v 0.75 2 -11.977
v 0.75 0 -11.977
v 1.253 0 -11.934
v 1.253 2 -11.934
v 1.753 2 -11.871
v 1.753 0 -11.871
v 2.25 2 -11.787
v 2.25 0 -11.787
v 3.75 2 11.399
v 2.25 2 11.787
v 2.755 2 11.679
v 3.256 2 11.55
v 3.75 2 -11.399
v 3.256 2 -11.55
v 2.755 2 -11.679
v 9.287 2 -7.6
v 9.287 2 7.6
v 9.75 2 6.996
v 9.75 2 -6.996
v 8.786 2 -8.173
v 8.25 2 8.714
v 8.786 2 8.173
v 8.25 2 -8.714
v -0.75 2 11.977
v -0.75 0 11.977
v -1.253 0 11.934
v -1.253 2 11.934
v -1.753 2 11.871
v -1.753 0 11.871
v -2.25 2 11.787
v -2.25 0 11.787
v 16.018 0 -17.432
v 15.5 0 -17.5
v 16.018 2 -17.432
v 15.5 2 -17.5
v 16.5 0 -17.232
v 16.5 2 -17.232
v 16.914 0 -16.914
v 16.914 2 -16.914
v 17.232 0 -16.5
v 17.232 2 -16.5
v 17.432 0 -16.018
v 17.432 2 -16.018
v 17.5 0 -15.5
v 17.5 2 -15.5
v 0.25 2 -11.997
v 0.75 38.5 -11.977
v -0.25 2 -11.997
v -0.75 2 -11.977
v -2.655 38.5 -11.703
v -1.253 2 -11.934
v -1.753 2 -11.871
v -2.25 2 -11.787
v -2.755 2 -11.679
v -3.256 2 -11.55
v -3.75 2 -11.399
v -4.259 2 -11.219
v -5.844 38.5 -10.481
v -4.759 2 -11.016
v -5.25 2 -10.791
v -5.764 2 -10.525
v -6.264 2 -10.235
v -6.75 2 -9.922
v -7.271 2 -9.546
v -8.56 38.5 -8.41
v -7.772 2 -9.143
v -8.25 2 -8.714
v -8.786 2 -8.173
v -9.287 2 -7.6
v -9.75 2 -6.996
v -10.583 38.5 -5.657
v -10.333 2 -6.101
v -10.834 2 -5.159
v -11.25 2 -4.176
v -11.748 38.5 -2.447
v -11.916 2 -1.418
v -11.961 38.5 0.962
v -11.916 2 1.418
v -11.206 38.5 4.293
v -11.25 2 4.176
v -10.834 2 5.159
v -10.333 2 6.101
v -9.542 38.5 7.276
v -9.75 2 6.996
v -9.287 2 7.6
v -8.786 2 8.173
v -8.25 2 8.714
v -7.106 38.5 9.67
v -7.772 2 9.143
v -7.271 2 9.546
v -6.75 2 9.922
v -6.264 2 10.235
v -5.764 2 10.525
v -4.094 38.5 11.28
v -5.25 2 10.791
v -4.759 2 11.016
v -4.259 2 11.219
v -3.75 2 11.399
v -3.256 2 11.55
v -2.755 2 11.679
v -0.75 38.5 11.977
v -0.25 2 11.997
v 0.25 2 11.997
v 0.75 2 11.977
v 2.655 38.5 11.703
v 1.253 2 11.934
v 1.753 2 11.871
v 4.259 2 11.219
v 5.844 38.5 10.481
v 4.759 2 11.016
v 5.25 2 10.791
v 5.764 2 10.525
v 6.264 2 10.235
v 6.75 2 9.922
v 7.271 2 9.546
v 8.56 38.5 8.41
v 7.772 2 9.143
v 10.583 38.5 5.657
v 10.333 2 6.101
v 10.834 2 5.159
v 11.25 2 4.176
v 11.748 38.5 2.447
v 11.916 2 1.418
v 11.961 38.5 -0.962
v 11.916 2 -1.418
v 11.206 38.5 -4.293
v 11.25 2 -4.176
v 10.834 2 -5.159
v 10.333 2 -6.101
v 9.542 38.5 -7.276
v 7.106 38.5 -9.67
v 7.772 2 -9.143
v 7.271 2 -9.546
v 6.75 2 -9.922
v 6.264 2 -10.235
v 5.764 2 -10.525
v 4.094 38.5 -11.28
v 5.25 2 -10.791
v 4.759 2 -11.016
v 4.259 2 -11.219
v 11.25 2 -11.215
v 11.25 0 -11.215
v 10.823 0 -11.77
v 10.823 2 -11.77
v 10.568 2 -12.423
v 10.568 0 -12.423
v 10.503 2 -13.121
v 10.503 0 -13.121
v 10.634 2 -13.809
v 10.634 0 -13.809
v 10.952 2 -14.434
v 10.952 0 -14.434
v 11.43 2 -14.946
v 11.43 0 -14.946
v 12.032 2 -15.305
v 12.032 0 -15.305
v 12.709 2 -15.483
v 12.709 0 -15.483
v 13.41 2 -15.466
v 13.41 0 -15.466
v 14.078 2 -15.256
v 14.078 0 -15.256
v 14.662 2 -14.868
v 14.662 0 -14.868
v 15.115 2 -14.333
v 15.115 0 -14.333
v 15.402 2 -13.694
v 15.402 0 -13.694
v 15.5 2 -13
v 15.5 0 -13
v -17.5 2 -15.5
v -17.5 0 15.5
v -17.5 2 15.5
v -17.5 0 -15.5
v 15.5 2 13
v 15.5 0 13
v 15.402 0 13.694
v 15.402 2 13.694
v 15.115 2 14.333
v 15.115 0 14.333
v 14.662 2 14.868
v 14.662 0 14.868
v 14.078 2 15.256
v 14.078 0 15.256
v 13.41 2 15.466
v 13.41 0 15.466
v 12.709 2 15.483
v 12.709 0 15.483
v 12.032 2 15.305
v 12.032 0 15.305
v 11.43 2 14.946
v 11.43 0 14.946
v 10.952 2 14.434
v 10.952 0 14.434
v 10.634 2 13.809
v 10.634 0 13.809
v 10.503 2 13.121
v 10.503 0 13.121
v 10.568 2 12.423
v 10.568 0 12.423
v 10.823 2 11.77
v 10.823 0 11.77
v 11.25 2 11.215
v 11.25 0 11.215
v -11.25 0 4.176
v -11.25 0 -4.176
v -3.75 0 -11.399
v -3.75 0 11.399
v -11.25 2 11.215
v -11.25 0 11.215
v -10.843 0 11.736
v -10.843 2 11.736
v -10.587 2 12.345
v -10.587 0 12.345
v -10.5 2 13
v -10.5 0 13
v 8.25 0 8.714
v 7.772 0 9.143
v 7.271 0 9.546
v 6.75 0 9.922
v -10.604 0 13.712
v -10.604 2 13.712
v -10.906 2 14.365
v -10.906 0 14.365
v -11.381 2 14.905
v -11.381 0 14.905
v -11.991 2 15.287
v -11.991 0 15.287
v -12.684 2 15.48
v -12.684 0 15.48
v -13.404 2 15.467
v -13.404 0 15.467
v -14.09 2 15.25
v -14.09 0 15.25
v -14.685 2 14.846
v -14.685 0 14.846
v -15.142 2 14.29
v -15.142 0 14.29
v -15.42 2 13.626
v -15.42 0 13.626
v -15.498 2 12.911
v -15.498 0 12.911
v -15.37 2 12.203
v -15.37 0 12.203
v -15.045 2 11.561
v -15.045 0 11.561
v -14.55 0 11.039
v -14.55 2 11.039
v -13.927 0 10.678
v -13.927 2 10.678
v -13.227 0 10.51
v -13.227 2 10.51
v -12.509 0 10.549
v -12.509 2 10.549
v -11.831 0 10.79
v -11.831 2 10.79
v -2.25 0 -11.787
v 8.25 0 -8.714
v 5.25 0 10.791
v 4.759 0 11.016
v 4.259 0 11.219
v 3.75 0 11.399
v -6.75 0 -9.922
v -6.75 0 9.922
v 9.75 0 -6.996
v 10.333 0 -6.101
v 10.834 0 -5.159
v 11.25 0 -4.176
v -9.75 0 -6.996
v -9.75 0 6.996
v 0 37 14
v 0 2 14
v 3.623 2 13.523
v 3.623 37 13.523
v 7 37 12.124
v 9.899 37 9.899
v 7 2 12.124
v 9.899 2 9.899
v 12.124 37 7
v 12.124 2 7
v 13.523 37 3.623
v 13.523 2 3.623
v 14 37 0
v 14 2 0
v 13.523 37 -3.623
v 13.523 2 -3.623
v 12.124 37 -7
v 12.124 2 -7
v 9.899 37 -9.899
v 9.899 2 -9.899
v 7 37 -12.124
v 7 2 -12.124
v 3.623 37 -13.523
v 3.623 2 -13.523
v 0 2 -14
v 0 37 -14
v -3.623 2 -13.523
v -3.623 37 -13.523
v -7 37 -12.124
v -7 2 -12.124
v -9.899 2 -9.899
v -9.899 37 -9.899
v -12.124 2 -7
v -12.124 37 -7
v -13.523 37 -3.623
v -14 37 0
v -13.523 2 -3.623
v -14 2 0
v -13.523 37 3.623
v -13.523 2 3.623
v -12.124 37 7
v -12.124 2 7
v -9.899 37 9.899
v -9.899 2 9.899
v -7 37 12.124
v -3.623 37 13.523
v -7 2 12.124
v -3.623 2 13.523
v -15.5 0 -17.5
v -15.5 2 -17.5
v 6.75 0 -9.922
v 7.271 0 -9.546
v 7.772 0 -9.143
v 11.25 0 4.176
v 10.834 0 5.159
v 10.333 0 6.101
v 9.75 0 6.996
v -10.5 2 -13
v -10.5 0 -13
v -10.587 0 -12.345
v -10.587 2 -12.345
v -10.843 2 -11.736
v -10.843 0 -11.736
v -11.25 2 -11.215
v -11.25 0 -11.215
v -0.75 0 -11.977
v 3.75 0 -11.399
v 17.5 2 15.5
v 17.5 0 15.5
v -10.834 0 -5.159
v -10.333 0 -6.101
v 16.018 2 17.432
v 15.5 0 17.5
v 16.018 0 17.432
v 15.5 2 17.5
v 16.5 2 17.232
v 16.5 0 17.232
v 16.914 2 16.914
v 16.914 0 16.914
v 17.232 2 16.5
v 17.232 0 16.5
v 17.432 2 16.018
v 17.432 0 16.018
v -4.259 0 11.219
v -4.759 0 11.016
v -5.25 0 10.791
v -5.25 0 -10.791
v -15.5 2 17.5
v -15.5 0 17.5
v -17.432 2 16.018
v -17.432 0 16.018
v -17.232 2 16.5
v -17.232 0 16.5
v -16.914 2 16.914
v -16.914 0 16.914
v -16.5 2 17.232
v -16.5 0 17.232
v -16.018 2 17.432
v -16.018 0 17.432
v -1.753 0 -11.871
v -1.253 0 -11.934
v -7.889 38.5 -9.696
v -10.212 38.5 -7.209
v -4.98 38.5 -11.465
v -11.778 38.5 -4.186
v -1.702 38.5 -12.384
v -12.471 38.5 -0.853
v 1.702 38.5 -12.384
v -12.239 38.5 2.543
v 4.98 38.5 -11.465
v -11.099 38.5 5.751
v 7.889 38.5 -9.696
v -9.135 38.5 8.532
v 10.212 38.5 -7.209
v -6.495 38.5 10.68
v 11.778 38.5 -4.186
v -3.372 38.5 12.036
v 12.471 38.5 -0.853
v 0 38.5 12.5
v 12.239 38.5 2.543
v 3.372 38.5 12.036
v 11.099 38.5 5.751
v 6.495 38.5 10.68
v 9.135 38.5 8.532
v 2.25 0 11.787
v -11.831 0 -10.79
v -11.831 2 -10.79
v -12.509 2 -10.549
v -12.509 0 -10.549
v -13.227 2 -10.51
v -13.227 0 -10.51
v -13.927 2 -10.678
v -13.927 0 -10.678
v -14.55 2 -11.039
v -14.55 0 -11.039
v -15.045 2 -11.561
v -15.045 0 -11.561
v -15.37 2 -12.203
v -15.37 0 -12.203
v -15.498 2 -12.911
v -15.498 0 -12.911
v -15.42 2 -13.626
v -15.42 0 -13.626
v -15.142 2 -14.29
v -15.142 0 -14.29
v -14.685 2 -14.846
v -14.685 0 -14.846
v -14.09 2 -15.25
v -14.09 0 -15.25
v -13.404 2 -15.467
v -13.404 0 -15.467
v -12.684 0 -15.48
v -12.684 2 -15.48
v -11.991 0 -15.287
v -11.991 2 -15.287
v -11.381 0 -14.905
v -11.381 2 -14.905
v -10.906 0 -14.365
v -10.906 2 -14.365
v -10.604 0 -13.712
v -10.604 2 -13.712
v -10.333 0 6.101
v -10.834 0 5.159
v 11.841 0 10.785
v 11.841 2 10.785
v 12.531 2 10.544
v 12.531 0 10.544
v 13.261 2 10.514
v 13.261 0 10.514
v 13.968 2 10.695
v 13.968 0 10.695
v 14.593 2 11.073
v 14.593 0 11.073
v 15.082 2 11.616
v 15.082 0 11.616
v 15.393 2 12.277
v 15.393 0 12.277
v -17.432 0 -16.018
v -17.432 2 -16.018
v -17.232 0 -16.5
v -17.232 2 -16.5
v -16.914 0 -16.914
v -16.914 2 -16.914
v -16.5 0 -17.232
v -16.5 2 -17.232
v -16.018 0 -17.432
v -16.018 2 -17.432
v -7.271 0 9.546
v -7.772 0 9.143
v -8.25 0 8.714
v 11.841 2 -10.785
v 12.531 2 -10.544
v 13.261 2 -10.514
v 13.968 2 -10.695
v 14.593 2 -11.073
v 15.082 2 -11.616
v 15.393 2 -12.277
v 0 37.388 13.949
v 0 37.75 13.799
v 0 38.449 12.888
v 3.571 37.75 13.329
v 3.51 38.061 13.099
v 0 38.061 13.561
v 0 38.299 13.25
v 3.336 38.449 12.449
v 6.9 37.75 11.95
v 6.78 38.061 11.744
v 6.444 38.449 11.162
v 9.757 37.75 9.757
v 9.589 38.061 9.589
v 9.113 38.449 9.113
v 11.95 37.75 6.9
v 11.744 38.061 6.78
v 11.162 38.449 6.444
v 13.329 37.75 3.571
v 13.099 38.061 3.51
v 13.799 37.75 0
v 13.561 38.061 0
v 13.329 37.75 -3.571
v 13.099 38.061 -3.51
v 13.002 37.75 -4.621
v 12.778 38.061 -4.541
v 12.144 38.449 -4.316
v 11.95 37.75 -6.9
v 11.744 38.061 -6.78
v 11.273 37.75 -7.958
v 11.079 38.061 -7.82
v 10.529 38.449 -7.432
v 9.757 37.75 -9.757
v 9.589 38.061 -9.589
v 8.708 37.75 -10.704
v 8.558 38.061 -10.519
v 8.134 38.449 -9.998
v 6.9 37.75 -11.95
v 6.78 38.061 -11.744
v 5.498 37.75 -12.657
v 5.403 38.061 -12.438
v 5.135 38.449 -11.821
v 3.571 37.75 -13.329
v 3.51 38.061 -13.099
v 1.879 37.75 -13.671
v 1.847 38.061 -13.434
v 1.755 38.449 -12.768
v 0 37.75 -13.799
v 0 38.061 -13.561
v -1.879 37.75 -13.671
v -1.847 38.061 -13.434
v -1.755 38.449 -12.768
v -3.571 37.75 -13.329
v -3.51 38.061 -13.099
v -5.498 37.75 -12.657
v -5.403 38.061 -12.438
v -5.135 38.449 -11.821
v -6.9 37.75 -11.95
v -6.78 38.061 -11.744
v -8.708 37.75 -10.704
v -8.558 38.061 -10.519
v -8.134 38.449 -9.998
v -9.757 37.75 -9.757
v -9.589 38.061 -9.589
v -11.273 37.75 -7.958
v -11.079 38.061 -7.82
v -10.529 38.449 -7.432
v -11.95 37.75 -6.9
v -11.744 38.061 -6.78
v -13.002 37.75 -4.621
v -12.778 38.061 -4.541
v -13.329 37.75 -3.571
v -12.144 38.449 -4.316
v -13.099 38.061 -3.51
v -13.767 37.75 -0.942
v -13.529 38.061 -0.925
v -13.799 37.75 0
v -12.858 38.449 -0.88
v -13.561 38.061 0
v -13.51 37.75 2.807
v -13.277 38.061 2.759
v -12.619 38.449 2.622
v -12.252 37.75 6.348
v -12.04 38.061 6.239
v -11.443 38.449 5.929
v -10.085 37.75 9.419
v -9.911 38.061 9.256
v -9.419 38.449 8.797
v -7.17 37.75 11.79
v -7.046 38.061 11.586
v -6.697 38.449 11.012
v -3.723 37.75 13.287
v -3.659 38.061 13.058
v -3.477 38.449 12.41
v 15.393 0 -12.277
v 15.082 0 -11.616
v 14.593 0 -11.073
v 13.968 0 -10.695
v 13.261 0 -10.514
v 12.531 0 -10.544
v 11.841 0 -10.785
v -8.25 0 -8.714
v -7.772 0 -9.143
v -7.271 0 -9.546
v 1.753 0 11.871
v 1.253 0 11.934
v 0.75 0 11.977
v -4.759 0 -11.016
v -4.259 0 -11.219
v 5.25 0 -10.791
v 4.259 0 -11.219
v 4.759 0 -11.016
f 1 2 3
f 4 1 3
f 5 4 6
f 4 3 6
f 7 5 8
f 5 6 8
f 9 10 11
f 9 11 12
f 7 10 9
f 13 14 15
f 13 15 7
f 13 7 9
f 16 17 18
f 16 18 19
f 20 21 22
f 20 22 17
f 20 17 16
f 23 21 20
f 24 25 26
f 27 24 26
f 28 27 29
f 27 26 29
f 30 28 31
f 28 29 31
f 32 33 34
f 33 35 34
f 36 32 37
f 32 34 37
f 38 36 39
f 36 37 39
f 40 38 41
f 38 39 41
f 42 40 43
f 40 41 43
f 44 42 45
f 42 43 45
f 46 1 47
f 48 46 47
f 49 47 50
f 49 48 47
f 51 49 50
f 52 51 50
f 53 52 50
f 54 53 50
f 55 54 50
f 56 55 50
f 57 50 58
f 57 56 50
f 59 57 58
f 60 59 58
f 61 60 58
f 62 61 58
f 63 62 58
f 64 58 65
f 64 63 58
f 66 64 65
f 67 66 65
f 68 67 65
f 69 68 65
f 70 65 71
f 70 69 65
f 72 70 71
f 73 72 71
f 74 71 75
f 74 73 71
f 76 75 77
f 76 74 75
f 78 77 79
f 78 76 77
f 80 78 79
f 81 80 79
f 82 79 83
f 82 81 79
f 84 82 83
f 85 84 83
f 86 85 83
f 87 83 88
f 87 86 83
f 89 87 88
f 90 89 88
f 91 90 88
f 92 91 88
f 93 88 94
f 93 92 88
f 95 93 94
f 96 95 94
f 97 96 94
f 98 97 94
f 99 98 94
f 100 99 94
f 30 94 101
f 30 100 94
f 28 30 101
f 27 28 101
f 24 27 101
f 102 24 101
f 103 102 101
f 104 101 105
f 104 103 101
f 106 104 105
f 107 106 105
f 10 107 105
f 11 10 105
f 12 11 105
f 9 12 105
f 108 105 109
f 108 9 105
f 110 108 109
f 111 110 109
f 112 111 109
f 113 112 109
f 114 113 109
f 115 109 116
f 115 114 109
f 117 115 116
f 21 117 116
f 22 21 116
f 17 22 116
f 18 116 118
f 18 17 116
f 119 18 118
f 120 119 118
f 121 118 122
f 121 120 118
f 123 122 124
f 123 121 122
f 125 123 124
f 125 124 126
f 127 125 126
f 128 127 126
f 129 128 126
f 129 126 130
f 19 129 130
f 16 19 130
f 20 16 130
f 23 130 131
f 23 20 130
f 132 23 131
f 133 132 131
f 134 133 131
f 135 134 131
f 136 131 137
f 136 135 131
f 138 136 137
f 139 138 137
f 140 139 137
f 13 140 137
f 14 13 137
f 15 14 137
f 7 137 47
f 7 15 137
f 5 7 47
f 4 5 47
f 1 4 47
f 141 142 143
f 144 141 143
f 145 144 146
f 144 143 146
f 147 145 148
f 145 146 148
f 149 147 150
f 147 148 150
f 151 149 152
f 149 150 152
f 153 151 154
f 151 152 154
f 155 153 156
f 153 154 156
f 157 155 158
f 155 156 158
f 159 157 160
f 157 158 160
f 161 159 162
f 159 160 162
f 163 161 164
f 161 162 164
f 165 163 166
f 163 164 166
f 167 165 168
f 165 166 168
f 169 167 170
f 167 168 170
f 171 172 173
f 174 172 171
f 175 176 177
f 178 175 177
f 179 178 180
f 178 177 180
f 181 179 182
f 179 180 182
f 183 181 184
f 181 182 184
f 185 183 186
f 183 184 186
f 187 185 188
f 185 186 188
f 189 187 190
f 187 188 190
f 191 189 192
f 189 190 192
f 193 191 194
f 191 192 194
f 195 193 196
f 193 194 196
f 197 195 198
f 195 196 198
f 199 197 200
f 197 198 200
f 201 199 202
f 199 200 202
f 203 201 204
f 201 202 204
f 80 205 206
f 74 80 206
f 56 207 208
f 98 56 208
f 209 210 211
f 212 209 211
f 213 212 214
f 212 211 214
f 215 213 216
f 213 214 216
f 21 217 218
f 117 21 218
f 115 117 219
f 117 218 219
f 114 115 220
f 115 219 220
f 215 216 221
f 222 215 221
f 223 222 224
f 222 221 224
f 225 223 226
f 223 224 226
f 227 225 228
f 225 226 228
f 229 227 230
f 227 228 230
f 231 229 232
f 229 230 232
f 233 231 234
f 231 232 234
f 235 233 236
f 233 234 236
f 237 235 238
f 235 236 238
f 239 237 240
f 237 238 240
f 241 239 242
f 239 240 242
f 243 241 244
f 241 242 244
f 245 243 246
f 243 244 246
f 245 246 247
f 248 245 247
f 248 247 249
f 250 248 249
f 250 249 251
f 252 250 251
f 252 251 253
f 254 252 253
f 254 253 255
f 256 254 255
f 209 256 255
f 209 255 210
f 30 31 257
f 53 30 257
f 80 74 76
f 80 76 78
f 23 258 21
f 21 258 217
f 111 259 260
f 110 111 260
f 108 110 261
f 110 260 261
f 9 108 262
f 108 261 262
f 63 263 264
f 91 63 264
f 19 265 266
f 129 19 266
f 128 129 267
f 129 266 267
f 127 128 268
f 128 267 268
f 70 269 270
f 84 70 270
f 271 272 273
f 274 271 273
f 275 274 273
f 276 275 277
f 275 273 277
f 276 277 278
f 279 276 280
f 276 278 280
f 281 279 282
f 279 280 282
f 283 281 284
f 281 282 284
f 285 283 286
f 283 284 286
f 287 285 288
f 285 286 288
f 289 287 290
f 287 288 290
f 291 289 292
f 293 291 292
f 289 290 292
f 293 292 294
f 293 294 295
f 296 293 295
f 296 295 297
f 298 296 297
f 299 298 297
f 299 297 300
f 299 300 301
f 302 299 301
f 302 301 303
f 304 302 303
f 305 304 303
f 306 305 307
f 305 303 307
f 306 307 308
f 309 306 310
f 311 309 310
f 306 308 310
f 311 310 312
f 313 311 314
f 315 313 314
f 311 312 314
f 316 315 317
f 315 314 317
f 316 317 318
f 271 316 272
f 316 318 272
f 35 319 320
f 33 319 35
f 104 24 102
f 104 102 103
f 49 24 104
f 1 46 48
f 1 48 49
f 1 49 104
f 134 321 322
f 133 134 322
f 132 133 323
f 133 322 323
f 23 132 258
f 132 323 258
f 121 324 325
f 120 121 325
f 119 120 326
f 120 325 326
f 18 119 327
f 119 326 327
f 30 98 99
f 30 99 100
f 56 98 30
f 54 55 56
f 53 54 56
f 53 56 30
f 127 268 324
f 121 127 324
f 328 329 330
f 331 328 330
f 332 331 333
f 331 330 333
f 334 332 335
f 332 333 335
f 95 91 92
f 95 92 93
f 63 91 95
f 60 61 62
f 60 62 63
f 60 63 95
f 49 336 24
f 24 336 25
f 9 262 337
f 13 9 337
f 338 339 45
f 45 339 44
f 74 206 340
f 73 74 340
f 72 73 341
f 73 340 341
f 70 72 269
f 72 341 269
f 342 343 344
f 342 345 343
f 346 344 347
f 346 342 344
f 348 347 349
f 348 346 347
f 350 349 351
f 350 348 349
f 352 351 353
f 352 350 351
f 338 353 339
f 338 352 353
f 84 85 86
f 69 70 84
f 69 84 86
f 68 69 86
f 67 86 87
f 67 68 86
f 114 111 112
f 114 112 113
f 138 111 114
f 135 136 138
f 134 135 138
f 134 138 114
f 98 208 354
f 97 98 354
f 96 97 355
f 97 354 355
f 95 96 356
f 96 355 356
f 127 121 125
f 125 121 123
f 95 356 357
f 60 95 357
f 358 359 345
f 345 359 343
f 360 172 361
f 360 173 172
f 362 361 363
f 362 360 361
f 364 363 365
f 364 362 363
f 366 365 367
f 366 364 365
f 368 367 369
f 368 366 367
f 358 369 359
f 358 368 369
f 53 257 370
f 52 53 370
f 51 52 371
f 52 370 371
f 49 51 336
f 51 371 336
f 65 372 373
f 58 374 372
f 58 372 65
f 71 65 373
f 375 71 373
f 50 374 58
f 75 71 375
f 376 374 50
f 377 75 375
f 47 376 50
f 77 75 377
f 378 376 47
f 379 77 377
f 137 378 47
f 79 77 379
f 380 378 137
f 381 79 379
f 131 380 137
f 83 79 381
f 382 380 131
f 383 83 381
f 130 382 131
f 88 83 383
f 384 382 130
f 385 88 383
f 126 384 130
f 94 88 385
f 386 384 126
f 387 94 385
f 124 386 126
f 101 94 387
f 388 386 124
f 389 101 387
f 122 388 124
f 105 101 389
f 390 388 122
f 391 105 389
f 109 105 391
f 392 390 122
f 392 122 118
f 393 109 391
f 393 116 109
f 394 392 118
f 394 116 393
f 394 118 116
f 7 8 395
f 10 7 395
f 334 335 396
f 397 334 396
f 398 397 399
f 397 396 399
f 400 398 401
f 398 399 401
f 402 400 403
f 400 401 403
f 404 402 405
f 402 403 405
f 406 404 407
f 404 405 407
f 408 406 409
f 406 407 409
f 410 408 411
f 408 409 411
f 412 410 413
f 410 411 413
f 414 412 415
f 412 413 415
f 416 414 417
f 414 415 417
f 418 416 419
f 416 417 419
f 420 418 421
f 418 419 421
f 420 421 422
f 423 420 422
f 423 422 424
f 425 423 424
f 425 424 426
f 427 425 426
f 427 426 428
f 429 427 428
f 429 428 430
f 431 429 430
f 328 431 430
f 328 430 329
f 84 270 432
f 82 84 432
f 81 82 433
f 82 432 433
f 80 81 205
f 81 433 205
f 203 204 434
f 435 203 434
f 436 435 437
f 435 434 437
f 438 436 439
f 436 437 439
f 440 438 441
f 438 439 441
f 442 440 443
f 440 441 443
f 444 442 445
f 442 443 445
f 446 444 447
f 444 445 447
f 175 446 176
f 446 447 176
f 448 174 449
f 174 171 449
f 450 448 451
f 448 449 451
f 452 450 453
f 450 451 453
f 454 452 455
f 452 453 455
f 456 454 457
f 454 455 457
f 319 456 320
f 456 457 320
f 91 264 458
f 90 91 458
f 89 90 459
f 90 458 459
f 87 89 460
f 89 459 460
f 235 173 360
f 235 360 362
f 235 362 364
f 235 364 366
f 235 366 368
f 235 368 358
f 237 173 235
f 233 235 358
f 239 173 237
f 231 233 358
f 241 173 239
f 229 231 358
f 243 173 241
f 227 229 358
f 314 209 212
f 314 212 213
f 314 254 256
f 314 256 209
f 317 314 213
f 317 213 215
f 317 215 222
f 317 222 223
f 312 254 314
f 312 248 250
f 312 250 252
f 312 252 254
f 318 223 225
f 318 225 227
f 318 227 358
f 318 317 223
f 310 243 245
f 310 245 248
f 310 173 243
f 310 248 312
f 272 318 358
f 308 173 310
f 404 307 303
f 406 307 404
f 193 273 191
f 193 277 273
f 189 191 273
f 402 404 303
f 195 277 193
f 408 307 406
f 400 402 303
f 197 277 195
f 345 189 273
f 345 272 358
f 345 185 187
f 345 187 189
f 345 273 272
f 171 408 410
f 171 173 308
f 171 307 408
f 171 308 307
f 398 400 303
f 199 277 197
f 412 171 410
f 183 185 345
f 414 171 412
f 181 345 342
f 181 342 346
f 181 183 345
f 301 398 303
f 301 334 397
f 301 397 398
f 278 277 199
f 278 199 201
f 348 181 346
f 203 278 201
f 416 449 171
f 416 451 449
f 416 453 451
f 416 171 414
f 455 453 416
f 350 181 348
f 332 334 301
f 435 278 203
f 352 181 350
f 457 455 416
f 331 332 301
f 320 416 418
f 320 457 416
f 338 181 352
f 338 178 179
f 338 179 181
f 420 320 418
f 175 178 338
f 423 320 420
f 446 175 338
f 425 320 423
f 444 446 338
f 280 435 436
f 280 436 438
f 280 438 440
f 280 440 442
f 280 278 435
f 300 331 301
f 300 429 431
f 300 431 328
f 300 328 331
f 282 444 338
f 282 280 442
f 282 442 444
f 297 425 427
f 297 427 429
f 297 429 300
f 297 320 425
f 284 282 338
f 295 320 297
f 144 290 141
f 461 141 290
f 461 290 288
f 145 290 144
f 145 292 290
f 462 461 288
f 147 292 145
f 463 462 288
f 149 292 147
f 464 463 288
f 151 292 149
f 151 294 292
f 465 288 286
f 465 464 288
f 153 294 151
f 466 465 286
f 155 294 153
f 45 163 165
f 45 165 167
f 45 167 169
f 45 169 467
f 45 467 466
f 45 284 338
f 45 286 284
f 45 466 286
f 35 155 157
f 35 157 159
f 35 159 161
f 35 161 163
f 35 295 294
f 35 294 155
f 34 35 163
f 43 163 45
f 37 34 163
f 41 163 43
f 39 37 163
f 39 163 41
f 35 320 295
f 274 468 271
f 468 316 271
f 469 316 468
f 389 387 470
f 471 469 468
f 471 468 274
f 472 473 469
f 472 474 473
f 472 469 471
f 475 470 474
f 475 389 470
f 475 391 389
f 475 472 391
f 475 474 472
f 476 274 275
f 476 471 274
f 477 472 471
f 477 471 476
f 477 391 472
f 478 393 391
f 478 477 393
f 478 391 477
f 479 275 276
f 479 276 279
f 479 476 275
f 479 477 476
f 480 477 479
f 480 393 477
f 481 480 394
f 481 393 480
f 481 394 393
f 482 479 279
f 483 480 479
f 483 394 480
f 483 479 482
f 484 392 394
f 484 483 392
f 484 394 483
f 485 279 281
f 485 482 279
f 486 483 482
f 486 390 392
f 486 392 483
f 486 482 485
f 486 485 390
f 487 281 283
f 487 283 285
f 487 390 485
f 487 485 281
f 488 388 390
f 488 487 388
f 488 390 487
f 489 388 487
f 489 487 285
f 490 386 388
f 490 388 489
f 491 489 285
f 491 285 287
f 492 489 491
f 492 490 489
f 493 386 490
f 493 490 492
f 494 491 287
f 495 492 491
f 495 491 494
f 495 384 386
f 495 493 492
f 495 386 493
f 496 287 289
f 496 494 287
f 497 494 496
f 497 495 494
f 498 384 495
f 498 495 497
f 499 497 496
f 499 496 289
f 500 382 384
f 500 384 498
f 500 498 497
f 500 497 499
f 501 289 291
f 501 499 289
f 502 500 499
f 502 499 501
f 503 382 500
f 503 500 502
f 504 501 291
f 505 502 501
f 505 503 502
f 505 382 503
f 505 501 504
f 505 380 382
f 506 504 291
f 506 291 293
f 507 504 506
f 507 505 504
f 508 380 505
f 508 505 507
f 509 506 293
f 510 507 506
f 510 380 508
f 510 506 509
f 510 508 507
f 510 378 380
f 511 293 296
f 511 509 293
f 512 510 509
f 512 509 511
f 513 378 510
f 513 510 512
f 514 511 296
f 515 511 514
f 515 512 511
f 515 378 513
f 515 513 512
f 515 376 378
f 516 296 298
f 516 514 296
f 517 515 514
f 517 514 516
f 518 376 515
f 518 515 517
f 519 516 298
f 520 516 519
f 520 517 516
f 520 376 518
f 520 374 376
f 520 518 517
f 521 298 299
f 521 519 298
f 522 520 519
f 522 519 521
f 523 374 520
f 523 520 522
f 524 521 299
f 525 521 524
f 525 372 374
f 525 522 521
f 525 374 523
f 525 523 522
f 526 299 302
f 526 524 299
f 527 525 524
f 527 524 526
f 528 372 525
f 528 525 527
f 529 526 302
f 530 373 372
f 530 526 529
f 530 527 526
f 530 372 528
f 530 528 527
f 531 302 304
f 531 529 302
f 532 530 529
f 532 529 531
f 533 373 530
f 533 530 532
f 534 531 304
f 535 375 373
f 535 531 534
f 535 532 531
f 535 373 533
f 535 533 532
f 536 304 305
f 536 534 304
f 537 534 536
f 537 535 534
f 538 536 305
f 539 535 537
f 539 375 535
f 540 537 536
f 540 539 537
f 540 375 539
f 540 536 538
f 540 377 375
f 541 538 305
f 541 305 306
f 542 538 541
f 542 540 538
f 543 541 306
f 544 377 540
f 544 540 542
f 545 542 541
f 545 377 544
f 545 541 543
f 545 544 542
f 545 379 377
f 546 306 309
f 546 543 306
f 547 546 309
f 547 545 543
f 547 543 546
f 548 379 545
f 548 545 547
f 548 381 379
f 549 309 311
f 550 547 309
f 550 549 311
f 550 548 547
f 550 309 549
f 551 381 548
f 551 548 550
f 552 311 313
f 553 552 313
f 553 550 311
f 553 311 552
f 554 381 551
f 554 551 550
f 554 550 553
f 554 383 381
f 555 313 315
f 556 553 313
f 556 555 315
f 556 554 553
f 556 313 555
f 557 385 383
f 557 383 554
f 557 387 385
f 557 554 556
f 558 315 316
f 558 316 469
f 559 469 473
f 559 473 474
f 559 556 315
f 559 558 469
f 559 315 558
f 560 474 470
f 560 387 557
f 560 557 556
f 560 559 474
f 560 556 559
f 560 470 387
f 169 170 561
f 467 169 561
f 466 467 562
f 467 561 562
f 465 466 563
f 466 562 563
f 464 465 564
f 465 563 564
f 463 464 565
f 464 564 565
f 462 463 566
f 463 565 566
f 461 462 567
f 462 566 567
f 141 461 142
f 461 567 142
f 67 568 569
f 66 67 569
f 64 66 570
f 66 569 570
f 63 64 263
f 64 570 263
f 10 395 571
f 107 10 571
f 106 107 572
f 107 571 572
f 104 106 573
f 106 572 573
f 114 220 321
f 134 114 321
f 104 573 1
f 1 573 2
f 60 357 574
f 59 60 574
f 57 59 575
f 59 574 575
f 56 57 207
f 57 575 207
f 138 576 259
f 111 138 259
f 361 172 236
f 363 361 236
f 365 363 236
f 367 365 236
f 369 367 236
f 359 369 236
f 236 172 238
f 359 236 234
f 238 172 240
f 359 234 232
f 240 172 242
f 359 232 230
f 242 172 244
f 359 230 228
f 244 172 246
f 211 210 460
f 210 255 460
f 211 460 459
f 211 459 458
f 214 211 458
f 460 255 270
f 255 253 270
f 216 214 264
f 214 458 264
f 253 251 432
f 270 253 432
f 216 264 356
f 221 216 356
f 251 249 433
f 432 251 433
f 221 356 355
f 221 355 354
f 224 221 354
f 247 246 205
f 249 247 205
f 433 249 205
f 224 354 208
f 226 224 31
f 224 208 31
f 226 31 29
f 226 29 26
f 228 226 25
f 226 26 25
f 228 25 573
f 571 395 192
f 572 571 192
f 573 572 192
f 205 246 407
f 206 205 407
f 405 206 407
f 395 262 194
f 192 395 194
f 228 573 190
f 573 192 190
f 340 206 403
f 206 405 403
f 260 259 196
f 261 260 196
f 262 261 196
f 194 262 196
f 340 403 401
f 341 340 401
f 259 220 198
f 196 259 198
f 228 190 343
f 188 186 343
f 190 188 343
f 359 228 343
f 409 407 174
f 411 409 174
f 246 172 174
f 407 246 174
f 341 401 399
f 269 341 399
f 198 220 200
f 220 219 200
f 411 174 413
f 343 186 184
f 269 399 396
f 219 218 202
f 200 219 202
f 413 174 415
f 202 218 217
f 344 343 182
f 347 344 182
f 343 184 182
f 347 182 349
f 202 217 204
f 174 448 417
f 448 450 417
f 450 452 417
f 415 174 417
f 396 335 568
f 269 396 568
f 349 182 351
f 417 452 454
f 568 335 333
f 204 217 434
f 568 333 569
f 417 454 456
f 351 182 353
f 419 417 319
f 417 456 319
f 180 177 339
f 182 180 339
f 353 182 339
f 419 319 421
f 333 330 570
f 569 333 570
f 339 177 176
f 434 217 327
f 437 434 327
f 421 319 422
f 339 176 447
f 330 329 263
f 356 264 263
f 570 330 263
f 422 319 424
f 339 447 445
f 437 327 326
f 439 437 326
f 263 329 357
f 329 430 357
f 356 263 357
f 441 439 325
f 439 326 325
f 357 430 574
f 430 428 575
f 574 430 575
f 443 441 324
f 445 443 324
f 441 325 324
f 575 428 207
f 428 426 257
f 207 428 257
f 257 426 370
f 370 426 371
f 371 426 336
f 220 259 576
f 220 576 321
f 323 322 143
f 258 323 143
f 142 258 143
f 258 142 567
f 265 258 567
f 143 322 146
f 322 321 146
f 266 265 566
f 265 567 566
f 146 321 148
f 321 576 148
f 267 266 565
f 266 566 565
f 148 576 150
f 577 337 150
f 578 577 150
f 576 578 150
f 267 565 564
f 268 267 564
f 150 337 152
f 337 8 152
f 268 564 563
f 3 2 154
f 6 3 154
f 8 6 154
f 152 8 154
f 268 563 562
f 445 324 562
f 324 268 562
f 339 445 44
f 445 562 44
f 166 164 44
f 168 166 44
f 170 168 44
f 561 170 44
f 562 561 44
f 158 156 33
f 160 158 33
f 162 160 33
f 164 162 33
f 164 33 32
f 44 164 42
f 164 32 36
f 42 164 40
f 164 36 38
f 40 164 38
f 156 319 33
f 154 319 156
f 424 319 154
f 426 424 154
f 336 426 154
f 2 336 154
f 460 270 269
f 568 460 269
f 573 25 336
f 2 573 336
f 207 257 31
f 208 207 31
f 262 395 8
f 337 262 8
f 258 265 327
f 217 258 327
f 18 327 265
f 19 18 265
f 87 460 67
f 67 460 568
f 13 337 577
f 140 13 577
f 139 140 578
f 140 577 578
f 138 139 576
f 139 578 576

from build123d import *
from build123d.topology import SkipClean

# Parameters (mm, degrees)
ESBO_O1_W                = 35
ESBO_O1_H                = 35
RESSALTO_EXTRUS_O1_DEPTH = 2
FILETE2_R                = 2
ESBO_O3_R                = 14
ESBO_O3_R_2              = 12
RESSALTO_EXTRUS_O3_DEPTH = 36.5
FILETE3_R                = 1.5


with BuildPart() as part:
    # Esboço1 → Ressalto-extrusão1 (new body)
    with BuildSketch(Plane(origin=(0, 0, 0), x_dir=(1, 0, 0), z_dir=(0, 1, 0))):
        Rectangle(ESBO_O1_W, ESBO_O1_H)
        with BuildLine():
            ThreePointArc((-10.5, -13), (-15.304886114, -13.968245837), (-11.25, -11.214642893))
            ThreePointArc((-11.25, -11.214642893), (-10.695113886, -12.031754163), (-10.5, -13))
        make_face(mode=Mode.SUBTRACT)
        with BuildLine():
            ThreePointArc((15.5, -13), (12.031754163, -15.304886114), (11.25, -11.214642893))
            ThreePointArc((11.25, -11.214642893), (13.968245837, -10.695113886), (15.5, -13))
        make_face(mode=Mode.SUBTRACT)
        with BuildLine():
            ThreePointArc((-9.75, -6.99553429), (-10.59422921, -5.635805838), (-11.25, -4.175823272))
            Line((-11.25, -4.175823272), (-11.25, 4.175823272))
            ThreePointArc((-11.25, 4.175823272), (-10.59422921, 5.635805838), (-9.75, 6.99553429))
            Line((-9.75, 6.99553429), (-9.75, -6.99553429))
        make_face(mode=Mode.SUBTRACT)
        with BuildLine():
            ThreePointArc((-6.75, -9.921567416), (-7.524255874, -9.348025115), (-8.25, -8.714212529))
            Line((-8.25, -8.714212529), (-8.25, 8.714212529))
            ThreePointArc((-8.25, 8.714212529), (-7.524255874, 9.348025115), (-6.75, 9.921567416))
            Line((-6.75, 9.921567416), (-6.75, -9.921567416))
        make_face(mode=Mode.SUBTRACT)
        with BuildLine():
            ThreePointArc((-3.75, -11.399013115), (-4.510269977, -11.120137802), (-5.25, -10.790620927))
            Line((-5.25, -10.790620927), (-5.25, 10.790620927))
            ThreePointArc((-5.25, 10.790620927), (-4.510269977, 11.120137802), (-3.75, 11.399013115))
            Line((-3.75, 11.399013115), (-3.75, -11.399013115))
        make_face(mode=Mode.SUBTRACT)
        with BuildLine():
            Line((-0.75, 11.976539567), (-0.75, -11.976539567))
            ThreePointArc((-0.75, -11.976539567), (-1.502985267, -11.905504411), (-2.25, -11.787175234))
            Line((-2.25, -11.787175234), (-2.25, 11.787175234))
            ThreePointArc((-2.25, 11.787175234), (-1.502985267, 11.905504411), (-0.75, 11.976539567))
        make_face(mode=Mode.SUBTRACT)
        with BuildLine():
            ThreePointArc((-10.5, 13), (-10.695113886, 12.031754163), (-11.25, 11.214642893))
            ThreePointArc((-11.25, 11.214642893), (-15.304886114, 13.968245837), (-10.5, 13))
        make_face(mode=Mode.SUBTRACT)
        with BuildLine():
            ThreePointArc((2.25, -11.787175234), (1.502985267, -11.905504411), (0.75, -11.976539567))
            Line((0.75, -11.976539567), (0.75, 11.976539567))
            ThreePointArc((0.75, 11.976539567), (1.502985267, 11.905504411), (2.25, 11.787175234))
            Line((2.25, 11.787175234), (2.25, -11.787175234))
        make_face(mode=Mode.SUBTRACT)
        with BuildLine():
            ThreePointArc((5.25, -10.790620927), (4.510269977, -11.120137802), (3.75, -11.399013115))
            Line((3.75, -11.399013115), (3.75, 11.399013115))
            ThreePointArc((3.75, 11.399013115), (4.510269977, 11.120137802), (5.25, 10.790620927))
            Line((5.25, 10.790620927), (5.25, -10.790620927))
        make_face(mode=Mode.SUBTRACT)
        with BuildLine():
            ThreePointArc((8.25, -8.714212529), (7.524255874, -9.348025115), (6.75, -9.921567416))
            Line((6.75, -9.921567416), (6.75, 9.921567416))
            ThreePointArc((6.75, 9.921567416), (7.524255874, 9.348025115), (8.25, 8.714212529))
            Line((8.25, 8.714212529), (8.25, -8.714212529))
        make_face(mode=Mode.SUBTRACT)
        with BuildLine():
            ThreePointArc((11.25, -4.175823272), (10.59422921, -5.635805838), (9.75, -6.99553429))
            Line((9.75, -6.99553429), (9.75, 6.99553429))
            ThreePointArc((9.75, 6.99553429), (10.59422921, 5.635805838), (11.25, 4.175823272))
            Line((11.25, 4.175823272), (11.25, -4.175823272))
        make_face(mode=Mode.SUBTRACT)
        with BuildLine():
            ThreePointArc((15.5, 13), (13.968245837, 10.695113886), (11.25, 11.214642893))
            ThreePointArc((11.25, 11.214642893), (12.031754163, 15.304886114), (15.5, 13))
        make_face(mode=Mode.SUBTRACT)
    extrude(amount=RESSALTO_EXTRUS_O1_DEPTH)

    # Filete2
    filete2_edges = [part.edges().sort_by_distance(p)[0] for p in [
        (-17.5, 1, 17.5),
        (-17.5, 1, -17.5),
        (17.5, 1, -17.5),
        (17.5, 1, 17.5),
    ]]
    fillet(filete2_edges, radius=FILETE2_R)

    # Esboço3 → Ressalto-extrusão3 (add)
    with SkipClean():  # the faces are left unmerged after this step: merging them gives an invalid solid
        with BuildSketch(Plane(origin=(0, 2, 0), x_dir=(1, 0, 0), z_dir=(0, 1, 0))):
            with Locations(Location((0, 0, 0), (0, 0, 270))):
                Circle(ESBO_O3_R)
            with Locations(Location((0, 0, 0), (0, 0, 86.416678302))):
                Circle(ESBO_O3_R_2, mode=Mode.SUBTRACT)
        extrude(amount=RESSALTO_EXTRUS_O3_DEPTH)

    # Filete3
    filete3_edges = [part.edges().sort_by_distance(p)[0] for p in [
        (0, 38.5, -14),
    ]]
    fillet(filete3_edges, radius=FILETE3_R)


solid = part.part
